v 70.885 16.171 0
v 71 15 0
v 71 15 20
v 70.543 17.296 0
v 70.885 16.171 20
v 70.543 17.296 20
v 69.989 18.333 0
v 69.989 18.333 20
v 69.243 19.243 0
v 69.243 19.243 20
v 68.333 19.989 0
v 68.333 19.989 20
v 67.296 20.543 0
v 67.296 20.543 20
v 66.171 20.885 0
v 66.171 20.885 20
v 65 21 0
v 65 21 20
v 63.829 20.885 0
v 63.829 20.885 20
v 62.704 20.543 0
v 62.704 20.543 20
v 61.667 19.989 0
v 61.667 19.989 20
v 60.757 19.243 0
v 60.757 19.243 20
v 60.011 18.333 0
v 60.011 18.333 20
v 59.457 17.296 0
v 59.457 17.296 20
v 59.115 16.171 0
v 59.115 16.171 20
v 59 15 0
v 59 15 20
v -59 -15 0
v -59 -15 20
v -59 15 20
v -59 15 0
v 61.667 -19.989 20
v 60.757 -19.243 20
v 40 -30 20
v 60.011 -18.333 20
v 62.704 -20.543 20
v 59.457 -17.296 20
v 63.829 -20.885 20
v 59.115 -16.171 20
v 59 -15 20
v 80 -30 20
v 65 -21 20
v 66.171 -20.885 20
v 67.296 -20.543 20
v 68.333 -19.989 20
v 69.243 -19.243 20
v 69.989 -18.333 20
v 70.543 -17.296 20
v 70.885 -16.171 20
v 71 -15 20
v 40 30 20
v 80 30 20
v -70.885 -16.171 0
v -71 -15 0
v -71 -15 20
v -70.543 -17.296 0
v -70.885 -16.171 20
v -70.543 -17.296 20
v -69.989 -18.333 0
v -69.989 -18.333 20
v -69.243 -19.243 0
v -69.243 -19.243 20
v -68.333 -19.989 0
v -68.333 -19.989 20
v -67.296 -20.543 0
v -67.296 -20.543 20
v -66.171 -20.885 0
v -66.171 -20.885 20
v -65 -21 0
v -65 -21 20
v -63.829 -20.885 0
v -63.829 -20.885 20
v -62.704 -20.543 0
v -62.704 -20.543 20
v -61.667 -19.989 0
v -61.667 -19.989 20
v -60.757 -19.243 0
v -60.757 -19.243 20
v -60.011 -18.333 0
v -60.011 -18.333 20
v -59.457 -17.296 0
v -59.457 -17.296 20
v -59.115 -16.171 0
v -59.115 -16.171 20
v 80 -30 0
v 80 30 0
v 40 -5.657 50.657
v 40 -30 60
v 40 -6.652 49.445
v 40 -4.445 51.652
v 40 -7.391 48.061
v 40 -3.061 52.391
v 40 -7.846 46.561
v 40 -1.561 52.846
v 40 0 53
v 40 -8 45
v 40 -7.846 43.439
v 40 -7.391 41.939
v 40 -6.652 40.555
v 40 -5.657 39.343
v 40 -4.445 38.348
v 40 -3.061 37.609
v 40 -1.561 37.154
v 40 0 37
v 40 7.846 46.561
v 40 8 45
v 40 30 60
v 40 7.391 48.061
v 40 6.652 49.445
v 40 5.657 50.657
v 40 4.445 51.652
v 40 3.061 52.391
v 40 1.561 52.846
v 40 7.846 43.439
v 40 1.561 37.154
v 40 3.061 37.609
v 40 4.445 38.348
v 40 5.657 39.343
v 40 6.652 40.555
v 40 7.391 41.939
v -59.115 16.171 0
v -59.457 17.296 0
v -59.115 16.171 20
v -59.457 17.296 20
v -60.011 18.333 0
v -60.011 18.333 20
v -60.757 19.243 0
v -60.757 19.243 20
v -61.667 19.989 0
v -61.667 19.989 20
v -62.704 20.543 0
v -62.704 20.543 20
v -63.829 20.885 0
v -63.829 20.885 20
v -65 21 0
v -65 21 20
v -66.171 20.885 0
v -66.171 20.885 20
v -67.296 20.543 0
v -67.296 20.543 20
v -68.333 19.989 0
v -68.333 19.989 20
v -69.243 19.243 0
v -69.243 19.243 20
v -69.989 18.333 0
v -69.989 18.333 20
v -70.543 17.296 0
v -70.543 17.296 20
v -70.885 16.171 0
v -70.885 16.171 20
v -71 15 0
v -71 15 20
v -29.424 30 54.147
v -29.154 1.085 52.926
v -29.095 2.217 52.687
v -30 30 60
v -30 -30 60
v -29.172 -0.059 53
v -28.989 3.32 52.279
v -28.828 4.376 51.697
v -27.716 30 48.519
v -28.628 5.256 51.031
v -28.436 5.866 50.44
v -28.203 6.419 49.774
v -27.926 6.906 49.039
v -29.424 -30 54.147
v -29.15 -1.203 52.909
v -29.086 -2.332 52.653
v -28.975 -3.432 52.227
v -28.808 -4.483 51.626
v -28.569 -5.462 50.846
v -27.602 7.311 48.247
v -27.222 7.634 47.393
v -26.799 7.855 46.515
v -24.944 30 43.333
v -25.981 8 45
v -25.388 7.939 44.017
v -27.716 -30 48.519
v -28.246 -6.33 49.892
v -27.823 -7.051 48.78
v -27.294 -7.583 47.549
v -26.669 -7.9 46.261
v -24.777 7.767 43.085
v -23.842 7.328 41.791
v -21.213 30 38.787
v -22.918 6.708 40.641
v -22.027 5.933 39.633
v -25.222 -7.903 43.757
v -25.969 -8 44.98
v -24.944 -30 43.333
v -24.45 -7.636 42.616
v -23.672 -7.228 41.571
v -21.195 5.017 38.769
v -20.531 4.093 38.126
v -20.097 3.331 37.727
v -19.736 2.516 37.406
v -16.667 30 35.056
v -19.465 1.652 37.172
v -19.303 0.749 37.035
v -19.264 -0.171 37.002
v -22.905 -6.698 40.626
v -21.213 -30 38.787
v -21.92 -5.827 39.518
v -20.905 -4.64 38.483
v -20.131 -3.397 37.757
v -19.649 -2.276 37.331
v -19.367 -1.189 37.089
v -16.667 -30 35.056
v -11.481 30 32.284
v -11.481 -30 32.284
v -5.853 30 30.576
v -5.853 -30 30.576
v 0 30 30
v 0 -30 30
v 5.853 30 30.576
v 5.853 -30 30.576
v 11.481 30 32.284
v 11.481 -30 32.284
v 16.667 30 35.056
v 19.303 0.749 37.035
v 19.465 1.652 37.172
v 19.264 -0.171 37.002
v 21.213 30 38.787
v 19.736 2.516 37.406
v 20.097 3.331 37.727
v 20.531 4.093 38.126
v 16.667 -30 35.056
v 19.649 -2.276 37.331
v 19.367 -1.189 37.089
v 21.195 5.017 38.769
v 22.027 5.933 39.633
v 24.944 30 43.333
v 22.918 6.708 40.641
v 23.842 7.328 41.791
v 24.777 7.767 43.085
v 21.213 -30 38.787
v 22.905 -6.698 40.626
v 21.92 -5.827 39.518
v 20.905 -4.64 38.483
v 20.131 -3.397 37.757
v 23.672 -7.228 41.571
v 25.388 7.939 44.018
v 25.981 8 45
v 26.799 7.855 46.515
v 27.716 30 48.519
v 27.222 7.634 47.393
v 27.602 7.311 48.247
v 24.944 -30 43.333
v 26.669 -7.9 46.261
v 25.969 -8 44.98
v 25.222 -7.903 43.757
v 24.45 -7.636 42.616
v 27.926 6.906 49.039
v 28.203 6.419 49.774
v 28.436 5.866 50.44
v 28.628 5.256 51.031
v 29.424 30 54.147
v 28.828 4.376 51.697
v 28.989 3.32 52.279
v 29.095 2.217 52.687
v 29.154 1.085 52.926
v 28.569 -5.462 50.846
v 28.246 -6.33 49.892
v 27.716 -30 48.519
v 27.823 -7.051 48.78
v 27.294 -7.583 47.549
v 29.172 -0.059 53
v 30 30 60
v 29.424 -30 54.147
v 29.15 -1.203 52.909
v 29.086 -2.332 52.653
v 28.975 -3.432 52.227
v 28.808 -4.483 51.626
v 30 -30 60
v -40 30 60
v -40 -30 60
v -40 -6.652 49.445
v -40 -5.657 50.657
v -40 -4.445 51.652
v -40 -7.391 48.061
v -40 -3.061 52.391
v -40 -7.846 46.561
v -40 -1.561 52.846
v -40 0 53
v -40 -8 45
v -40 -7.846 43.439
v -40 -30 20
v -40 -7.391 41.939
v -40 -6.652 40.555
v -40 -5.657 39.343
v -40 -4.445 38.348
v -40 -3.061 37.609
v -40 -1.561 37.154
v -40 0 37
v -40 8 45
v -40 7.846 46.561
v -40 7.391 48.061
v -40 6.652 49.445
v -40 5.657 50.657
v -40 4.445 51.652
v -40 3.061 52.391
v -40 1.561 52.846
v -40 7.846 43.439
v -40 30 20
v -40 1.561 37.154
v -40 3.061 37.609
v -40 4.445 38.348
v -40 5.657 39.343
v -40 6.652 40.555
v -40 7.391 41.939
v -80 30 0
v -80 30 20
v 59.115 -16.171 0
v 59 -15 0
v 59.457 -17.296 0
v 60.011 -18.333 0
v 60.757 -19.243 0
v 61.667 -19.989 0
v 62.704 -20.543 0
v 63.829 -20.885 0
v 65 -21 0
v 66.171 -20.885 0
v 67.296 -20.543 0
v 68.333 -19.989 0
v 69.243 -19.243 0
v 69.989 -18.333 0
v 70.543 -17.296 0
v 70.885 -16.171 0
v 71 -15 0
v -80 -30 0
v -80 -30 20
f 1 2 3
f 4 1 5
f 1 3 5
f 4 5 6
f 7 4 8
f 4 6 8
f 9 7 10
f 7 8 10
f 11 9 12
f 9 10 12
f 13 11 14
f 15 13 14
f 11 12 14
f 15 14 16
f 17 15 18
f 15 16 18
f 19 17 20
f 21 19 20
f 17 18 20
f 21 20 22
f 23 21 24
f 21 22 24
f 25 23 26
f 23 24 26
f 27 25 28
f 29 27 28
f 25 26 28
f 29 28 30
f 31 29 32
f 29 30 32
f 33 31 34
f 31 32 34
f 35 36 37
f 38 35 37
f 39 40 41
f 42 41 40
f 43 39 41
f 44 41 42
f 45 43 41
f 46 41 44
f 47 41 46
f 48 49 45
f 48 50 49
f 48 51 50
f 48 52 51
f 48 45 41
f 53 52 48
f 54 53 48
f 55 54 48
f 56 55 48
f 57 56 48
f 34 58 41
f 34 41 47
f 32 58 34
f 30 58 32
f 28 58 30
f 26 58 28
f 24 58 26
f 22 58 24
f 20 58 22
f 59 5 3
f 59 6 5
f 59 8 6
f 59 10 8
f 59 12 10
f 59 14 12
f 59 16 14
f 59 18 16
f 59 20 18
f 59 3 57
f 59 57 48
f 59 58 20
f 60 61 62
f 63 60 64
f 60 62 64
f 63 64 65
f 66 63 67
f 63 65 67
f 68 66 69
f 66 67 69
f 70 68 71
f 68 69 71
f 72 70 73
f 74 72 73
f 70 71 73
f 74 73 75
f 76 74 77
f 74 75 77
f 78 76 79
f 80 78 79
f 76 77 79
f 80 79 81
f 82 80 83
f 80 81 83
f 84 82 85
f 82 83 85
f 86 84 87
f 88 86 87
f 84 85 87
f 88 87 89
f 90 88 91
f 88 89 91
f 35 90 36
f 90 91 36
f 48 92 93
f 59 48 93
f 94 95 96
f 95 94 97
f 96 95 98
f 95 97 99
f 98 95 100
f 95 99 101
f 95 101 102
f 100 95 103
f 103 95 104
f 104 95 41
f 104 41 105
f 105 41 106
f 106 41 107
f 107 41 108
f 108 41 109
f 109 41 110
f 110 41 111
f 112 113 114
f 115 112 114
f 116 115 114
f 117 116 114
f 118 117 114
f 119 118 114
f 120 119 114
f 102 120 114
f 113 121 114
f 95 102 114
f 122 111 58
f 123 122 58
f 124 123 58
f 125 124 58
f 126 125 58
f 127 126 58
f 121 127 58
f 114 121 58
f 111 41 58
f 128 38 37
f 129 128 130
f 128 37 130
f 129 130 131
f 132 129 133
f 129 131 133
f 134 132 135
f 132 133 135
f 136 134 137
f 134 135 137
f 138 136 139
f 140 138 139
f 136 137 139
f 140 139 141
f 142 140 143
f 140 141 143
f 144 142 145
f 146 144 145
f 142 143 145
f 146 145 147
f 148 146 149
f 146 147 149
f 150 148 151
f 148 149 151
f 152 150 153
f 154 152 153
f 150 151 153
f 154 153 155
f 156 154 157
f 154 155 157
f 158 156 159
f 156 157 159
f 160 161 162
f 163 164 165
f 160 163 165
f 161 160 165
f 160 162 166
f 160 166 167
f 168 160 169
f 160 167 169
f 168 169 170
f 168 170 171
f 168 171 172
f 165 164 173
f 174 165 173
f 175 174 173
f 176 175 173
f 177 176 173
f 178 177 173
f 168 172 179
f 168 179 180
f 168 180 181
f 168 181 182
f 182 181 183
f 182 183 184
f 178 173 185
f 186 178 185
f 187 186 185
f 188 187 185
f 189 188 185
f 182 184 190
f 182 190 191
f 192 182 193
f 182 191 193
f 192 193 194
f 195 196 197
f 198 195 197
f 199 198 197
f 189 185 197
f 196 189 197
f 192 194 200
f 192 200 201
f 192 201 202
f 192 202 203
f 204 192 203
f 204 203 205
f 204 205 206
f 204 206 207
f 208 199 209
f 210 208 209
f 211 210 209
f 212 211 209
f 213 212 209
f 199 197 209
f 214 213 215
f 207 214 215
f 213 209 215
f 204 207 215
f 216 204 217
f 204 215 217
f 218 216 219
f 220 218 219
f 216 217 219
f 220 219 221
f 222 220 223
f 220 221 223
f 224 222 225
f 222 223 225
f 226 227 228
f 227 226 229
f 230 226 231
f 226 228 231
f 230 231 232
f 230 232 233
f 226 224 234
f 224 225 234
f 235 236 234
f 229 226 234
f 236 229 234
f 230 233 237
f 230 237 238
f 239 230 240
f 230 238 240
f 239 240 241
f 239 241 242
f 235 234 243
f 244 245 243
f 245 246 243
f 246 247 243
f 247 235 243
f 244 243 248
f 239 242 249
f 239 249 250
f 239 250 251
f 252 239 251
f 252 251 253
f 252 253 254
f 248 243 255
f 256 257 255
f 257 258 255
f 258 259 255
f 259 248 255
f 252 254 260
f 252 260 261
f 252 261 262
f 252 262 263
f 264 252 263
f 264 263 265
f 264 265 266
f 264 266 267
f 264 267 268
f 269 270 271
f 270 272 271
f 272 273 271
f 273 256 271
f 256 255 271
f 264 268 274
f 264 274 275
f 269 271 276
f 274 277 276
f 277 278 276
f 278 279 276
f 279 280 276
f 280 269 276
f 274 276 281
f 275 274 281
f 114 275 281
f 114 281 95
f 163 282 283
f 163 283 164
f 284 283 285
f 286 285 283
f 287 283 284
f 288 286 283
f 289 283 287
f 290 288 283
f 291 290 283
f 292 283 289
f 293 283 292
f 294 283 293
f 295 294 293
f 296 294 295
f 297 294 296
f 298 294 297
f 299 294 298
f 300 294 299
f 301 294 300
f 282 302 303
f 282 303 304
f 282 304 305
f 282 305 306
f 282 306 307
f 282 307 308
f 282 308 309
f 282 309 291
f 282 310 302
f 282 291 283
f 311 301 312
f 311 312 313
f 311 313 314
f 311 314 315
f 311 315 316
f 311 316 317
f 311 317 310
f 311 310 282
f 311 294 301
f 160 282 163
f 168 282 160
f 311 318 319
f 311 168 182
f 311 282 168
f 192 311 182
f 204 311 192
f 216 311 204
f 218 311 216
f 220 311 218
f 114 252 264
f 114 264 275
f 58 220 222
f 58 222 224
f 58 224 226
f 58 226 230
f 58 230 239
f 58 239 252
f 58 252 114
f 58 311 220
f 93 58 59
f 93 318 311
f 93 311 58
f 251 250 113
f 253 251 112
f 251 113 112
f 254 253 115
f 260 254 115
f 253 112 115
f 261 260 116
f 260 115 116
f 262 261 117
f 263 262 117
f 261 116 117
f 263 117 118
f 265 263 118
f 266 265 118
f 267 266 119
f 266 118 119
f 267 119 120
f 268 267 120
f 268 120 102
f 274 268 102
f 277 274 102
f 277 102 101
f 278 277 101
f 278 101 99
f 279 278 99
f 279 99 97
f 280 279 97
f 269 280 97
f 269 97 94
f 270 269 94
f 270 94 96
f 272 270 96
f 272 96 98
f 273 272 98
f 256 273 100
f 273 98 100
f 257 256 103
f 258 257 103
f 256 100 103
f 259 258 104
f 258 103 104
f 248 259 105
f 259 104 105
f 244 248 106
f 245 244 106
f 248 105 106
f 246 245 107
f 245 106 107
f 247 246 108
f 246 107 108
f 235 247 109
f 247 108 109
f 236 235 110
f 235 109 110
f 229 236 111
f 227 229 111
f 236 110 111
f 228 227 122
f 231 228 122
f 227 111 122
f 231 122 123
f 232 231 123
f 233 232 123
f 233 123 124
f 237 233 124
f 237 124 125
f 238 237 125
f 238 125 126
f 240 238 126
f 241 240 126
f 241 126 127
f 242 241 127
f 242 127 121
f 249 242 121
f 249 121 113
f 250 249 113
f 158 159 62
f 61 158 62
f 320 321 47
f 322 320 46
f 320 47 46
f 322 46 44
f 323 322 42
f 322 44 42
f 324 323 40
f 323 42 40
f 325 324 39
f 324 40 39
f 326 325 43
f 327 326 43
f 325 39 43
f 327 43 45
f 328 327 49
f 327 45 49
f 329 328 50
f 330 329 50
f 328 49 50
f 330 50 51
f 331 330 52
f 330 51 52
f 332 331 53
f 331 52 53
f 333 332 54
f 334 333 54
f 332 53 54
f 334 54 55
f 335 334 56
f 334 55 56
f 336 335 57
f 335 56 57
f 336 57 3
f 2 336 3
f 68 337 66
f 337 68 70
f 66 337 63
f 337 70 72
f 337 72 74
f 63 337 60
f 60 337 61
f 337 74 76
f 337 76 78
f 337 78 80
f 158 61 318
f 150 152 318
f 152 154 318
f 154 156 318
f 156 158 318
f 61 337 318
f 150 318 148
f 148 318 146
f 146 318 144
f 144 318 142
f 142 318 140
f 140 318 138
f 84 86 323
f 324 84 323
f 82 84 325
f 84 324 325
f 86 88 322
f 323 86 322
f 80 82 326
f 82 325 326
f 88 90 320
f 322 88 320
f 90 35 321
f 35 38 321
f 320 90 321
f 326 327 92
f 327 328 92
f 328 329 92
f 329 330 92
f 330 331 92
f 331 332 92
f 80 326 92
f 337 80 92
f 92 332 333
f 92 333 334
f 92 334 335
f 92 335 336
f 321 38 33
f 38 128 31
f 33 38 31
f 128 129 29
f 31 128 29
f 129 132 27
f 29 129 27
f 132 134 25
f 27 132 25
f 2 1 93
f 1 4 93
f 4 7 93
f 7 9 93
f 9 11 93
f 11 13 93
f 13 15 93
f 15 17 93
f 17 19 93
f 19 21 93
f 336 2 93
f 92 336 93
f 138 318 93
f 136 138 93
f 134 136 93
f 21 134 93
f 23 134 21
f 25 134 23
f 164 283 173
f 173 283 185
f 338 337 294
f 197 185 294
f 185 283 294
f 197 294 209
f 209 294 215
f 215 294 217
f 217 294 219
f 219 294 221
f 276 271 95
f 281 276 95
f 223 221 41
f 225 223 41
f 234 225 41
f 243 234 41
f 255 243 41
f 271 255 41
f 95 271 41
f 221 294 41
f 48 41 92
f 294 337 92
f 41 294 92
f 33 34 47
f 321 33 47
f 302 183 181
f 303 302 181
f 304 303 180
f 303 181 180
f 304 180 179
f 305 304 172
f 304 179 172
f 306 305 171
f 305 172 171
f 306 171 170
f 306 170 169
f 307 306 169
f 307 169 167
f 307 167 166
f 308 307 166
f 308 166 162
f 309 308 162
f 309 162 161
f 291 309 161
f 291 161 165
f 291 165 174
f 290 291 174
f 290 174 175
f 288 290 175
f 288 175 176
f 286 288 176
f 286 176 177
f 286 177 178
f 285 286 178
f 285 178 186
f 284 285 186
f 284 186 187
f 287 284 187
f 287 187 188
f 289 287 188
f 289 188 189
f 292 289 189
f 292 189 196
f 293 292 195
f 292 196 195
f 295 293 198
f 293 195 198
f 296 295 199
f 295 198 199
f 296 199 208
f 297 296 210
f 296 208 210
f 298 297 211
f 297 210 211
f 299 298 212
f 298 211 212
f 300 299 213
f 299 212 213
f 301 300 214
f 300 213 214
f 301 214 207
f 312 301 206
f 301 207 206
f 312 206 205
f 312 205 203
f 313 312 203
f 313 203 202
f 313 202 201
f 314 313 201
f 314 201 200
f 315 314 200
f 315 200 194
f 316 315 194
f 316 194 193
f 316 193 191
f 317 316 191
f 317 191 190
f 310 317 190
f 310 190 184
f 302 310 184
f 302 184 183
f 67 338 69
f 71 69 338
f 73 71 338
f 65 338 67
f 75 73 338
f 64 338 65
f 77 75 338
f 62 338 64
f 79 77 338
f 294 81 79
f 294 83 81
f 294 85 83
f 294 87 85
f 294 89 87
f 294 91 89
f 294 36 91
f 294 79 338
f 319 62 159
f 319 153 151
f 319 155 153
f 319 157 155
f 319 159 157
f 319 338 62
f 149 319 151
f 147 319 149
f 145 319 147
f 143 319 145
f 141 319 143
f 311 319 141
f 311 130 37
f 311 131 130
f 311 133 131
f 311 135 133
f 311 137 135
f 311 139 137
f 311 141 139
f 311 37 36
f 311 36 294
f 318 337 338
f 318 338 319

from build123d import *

# Parameters (mm, degrees)
F0_W     = 160
F0_H     = 60
F1_DEPTH = 20
F3_DEPTH = 20.001
F4_W     = 80
F4_H     = 60
F5_DEPTH = 40
F6_R     = 8
F7_DEPTH = 120.001
F9_DEPTH = 60.001


with BuildPart() as f1:
    # F0 (on Top) → F1 (new body)
    with BuildSketch(Plane.XY):
        Rectangle(F0_W, F0_H)
    extrude(amount=F1_DEPTH)

    # F2 (on face) → F3 (cut, through all)
    with BuildSketch(Plane.XY.offset(20)):
        with BuildLine():
            ThreePointArc((-71, -15), (-65, -21), (-59, -15))
            Line((-59, -15), (-59, 15))
            ThreePointArc((-59, 15), (-65, 21), (-71, 15))
            Line((-71, 15), (-71, -15))
        make_face()
        with BuildLine():
            ThreePointArc((59, -15), (65, -21), (71, -15))
            Line((71, -15), (71, 15))
            ThreePointArc((71, 15), (65, 21), (59, 15))
            Line((59, 15), (59, -15))
        make_face()
    extrude(amount=-F3_DEPTH, mode=Mode.SUBTRACT)

    # F4 (on face) → F5 (join)
    with BuildSketch(Plane.XY.offset(20)):
        Rectangle(F4_W, F4_H)
    extrude(amount=F5_DEPTH)

    # F6 (on face) → F7 (cut, through all)
    with BuildSketch(Plane.YZ.offset(40)):
        with Locations((0, 45)):
            Circle(F6_R)
    extrude(amount=-F7_DEPTH, mode=Mode.SUBTRACT)

    # F8 (on face) → F9 (cut, through all)
    with BuildSketch(Plane.XZ.offset(30)):
        with BuildLine():
            Line((-30, 60), (30, 60))
            ThreePointArc((30, 60), (0, 90), (-30, 60))
        make_face()
        with BuildLine():
            ThreePointArc((-30, 60), (0, 30), (30, 60))
            Line((30, 60), (-30, 60))
        make_face()
    extrude(amount=-F9_DEPTH, mode=Mode.SUBTRACT)


solid = f1.part
